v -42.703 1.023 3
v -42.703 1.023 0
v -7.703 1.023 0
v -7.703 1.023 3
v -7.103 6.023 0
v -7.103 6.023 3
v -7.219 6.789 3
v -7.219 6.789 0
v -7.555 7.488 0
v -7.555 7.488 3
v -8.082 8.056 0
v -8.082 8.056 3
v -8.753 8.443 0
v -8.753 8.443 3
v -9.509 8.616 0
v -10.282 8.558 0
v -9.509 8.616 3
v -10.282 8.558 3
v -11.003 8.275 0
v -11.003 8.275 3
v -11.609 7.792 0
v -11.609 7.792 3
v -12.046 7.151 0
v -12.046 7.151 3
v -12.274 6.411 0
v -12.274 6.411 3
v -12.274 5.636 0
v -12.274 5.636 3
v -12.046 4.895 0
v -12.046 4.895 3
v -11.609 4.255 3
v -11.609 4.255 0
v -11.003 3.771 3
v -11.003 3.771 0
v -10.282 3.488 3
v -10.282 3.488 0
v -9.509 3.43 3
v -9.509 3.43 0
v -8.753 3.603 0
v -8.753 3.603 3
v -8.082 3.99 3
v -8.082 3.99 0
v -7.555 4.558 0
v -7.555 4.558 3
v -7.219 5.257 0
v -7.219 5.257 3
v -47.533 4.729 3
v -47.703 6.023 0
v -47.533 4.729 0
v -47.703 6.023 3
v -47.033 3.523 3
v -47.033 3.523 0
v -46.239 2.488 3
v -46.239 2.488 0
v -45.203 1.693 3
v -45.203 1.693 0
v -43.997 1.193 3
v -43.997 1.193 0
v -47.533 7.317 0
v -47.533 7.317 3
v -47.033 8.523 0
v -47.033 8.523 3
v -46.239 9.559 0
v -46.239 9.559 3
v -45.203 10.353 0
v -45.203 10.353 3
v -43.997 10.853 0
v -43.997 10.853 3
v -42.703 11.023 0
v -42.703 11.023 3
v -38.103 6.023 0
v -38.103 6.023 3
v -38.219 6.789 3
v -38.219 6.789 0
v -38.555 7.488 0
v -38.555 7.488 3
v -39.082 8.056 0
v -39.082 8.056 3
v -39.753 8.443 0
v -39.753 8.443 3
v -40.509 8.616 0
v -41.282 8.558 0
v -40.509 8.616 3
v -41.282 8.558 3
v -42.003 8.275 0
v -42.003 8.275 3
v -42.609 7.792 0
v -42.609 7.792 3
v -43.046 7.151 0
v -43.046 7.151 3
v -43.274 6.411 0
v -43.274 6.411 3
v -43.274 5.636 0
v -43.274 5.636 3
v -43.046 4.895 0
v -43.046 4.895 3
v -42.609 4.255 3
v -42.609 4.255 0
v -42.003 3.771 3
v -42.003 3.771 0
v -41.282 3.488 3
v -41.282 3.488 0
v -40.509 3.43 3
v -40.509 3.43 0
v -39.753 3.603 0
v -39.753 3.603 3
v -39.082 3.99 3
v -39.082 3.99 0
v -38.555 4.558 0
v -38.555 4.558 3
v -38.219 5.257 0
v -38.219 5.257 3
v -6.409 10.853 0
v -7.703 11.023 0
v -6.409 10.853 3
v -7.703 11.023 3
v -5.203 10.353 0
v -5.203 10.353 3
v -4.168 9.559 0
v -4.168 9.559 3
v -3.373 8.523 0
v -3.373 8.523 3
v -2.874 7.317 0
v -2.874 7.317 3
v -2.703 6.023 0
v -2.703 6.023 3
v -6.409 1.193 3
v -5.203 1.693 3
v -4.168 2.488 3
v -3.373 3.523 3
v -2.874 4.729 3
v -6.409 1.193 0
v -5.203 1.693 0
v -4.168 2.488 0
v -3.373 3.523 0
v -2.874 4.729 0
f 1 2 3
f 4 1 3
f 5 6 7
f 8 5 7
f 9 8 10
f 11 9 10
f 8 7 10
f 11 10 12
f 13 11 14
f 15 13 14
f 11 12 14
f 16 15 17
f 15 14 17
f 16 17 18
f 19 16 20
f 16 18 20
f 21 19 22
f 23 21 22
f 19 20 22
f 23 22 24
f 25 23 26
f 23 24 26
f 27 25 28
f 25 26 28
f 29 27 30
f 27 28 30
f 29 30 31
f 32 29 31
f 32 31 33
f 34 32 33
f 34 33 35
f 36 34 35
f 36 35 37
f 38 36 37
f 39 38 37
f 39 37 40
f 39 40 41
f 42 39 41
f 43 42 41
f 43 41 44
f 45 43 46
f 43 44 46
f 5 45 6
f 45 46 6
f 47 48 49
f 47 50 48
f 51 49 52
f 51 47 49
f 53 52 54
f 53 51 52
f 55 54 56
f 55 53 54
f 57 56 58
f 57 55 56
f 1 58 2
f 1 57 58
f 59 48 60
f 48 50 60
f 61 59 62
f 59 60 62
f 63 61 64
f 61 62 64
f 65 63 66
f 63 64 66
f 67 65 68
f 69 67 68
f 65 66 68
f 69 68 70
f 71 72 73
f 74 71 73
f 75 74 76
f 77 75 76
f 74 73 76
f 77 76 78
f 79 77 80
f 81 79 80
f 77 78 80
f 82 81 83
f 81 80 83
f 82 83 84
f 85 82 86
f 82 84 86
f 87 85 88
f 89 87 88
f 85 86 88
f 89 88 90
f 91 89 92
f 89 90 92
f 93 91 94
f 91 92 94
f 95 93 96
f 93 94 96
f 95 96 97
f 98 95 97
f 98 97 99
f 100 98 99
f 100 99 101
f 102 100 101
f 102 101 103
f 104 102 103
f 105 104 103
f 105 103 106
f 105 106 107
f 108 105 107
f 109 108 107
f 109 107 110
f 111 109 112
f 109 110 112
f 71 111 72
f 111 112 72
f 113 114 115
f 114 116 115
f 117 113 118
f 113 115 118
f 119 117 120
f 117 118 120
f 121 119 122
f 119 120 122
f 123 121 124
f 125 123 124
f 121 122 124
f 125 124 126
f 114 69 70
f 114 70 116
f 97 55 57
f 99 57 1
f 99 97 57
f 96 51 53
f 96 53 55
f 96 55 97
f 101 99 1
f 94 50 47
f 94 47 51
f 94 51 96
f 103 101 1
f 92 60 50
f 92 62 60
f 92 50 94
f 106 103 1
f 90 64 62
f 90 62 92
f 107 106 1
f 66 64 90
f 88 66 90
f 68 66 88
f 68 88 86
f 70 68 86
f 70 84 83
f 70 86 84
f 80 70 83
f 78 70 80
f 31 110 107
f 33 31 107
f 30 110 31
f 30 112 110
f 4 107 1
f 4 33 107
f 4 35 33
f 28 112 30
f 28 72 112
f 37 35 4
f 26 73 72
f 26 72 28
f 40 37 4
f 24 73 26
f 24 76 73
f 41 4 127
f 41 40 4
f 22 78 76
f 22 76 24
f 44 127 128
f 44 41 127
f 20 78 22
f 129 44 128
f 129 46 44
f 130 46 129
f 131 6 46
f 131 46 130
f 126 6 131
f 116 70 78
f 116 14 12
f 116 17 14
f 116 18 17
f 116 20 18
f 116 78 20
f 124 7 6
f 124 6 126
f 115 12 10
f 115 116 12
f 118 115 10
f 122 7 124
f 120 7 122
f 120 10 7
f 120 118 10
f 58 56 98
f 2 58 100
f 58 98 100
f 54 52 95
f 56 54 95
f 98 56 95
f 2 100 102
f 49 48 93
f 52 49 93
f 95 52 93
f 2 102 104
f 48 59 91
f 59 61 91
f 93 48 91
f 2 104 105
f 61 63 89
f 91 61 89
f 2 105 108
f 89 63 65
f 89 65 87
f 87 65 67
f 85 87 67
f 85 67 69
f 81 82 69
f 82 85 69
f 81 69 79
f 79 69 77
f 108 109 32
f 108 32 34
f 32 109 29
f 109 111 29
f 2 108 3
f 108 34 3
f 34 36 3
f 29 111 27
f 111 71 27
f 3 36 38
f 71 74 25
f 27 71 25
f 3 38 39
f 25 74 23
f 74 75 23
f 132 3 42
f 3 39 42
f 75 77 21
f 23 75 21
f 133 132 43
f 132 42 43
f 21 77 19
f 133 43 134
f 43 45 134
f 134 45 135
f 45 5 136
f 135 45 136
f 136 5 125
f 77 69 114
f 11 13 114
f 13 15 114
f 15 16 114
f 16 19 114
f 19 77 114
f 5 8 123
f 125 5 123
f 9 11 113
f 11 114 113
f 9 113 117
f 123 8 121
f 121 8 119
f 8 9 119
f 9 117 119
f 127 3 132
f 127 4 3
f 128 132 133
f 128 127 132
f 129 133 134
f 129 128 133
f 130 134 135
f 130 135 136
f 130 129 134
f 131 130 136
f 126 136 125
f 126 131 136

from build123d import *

# Parameters (mm, degrees)
ESQUISSE1_W             = 45
ESQUISSE1_H             = 10
EXTRUSION1_DEPTH        = 3
ESQUISSE2_R             = 2.6
ENL_V_MAT_EXTRU_1_DEPTH = 3
CONG_1_R                = 5


with BuildPart() as part:
    # Esquisse1 → Extrusion1 (new body)
    with BuildSketch(Plane.XY):
        with Locations((-25.203257042, 6.02306338)):
            Rectangle(ESQUISSE1_W, ESQUISSE1_H)
    extrude(amount=EXTRUSION1_DEPTH)

    # Esquisse2 → Enlèv. mat.-Extru.1 (cut)
    with BuildSketch(Plane.XY.offset(3)):
        with Locations((-40.703257042, 6.02306338)):
            Circle(ESQUISSE2_R)
        with Locations((-9.703257042, 6.02306338)):
            Circle(ESQUISSE2_R)
    extrude(amount=-ENL_V_MAT_EXTRU_1_DEPTH, mode=Mode.SUBTRACT)

    # Congé1
    cong_1_edges = [part.edges().sort_by_distance(p)[0] for p in [
        (-47.703257042, 1.02306338, 1.5),
        (-2.703257042, 1.02306338, 1.5),
        (-2.703257042, 11.02306338, 1.5),
        (-47.703257042, 11.02306338, 1.5),
    ]]
    fillet(cong_1_edges, radius=CONG_1_R - 0.0001)  # a hair under: the kernel refuses the full size


solid = part.part
